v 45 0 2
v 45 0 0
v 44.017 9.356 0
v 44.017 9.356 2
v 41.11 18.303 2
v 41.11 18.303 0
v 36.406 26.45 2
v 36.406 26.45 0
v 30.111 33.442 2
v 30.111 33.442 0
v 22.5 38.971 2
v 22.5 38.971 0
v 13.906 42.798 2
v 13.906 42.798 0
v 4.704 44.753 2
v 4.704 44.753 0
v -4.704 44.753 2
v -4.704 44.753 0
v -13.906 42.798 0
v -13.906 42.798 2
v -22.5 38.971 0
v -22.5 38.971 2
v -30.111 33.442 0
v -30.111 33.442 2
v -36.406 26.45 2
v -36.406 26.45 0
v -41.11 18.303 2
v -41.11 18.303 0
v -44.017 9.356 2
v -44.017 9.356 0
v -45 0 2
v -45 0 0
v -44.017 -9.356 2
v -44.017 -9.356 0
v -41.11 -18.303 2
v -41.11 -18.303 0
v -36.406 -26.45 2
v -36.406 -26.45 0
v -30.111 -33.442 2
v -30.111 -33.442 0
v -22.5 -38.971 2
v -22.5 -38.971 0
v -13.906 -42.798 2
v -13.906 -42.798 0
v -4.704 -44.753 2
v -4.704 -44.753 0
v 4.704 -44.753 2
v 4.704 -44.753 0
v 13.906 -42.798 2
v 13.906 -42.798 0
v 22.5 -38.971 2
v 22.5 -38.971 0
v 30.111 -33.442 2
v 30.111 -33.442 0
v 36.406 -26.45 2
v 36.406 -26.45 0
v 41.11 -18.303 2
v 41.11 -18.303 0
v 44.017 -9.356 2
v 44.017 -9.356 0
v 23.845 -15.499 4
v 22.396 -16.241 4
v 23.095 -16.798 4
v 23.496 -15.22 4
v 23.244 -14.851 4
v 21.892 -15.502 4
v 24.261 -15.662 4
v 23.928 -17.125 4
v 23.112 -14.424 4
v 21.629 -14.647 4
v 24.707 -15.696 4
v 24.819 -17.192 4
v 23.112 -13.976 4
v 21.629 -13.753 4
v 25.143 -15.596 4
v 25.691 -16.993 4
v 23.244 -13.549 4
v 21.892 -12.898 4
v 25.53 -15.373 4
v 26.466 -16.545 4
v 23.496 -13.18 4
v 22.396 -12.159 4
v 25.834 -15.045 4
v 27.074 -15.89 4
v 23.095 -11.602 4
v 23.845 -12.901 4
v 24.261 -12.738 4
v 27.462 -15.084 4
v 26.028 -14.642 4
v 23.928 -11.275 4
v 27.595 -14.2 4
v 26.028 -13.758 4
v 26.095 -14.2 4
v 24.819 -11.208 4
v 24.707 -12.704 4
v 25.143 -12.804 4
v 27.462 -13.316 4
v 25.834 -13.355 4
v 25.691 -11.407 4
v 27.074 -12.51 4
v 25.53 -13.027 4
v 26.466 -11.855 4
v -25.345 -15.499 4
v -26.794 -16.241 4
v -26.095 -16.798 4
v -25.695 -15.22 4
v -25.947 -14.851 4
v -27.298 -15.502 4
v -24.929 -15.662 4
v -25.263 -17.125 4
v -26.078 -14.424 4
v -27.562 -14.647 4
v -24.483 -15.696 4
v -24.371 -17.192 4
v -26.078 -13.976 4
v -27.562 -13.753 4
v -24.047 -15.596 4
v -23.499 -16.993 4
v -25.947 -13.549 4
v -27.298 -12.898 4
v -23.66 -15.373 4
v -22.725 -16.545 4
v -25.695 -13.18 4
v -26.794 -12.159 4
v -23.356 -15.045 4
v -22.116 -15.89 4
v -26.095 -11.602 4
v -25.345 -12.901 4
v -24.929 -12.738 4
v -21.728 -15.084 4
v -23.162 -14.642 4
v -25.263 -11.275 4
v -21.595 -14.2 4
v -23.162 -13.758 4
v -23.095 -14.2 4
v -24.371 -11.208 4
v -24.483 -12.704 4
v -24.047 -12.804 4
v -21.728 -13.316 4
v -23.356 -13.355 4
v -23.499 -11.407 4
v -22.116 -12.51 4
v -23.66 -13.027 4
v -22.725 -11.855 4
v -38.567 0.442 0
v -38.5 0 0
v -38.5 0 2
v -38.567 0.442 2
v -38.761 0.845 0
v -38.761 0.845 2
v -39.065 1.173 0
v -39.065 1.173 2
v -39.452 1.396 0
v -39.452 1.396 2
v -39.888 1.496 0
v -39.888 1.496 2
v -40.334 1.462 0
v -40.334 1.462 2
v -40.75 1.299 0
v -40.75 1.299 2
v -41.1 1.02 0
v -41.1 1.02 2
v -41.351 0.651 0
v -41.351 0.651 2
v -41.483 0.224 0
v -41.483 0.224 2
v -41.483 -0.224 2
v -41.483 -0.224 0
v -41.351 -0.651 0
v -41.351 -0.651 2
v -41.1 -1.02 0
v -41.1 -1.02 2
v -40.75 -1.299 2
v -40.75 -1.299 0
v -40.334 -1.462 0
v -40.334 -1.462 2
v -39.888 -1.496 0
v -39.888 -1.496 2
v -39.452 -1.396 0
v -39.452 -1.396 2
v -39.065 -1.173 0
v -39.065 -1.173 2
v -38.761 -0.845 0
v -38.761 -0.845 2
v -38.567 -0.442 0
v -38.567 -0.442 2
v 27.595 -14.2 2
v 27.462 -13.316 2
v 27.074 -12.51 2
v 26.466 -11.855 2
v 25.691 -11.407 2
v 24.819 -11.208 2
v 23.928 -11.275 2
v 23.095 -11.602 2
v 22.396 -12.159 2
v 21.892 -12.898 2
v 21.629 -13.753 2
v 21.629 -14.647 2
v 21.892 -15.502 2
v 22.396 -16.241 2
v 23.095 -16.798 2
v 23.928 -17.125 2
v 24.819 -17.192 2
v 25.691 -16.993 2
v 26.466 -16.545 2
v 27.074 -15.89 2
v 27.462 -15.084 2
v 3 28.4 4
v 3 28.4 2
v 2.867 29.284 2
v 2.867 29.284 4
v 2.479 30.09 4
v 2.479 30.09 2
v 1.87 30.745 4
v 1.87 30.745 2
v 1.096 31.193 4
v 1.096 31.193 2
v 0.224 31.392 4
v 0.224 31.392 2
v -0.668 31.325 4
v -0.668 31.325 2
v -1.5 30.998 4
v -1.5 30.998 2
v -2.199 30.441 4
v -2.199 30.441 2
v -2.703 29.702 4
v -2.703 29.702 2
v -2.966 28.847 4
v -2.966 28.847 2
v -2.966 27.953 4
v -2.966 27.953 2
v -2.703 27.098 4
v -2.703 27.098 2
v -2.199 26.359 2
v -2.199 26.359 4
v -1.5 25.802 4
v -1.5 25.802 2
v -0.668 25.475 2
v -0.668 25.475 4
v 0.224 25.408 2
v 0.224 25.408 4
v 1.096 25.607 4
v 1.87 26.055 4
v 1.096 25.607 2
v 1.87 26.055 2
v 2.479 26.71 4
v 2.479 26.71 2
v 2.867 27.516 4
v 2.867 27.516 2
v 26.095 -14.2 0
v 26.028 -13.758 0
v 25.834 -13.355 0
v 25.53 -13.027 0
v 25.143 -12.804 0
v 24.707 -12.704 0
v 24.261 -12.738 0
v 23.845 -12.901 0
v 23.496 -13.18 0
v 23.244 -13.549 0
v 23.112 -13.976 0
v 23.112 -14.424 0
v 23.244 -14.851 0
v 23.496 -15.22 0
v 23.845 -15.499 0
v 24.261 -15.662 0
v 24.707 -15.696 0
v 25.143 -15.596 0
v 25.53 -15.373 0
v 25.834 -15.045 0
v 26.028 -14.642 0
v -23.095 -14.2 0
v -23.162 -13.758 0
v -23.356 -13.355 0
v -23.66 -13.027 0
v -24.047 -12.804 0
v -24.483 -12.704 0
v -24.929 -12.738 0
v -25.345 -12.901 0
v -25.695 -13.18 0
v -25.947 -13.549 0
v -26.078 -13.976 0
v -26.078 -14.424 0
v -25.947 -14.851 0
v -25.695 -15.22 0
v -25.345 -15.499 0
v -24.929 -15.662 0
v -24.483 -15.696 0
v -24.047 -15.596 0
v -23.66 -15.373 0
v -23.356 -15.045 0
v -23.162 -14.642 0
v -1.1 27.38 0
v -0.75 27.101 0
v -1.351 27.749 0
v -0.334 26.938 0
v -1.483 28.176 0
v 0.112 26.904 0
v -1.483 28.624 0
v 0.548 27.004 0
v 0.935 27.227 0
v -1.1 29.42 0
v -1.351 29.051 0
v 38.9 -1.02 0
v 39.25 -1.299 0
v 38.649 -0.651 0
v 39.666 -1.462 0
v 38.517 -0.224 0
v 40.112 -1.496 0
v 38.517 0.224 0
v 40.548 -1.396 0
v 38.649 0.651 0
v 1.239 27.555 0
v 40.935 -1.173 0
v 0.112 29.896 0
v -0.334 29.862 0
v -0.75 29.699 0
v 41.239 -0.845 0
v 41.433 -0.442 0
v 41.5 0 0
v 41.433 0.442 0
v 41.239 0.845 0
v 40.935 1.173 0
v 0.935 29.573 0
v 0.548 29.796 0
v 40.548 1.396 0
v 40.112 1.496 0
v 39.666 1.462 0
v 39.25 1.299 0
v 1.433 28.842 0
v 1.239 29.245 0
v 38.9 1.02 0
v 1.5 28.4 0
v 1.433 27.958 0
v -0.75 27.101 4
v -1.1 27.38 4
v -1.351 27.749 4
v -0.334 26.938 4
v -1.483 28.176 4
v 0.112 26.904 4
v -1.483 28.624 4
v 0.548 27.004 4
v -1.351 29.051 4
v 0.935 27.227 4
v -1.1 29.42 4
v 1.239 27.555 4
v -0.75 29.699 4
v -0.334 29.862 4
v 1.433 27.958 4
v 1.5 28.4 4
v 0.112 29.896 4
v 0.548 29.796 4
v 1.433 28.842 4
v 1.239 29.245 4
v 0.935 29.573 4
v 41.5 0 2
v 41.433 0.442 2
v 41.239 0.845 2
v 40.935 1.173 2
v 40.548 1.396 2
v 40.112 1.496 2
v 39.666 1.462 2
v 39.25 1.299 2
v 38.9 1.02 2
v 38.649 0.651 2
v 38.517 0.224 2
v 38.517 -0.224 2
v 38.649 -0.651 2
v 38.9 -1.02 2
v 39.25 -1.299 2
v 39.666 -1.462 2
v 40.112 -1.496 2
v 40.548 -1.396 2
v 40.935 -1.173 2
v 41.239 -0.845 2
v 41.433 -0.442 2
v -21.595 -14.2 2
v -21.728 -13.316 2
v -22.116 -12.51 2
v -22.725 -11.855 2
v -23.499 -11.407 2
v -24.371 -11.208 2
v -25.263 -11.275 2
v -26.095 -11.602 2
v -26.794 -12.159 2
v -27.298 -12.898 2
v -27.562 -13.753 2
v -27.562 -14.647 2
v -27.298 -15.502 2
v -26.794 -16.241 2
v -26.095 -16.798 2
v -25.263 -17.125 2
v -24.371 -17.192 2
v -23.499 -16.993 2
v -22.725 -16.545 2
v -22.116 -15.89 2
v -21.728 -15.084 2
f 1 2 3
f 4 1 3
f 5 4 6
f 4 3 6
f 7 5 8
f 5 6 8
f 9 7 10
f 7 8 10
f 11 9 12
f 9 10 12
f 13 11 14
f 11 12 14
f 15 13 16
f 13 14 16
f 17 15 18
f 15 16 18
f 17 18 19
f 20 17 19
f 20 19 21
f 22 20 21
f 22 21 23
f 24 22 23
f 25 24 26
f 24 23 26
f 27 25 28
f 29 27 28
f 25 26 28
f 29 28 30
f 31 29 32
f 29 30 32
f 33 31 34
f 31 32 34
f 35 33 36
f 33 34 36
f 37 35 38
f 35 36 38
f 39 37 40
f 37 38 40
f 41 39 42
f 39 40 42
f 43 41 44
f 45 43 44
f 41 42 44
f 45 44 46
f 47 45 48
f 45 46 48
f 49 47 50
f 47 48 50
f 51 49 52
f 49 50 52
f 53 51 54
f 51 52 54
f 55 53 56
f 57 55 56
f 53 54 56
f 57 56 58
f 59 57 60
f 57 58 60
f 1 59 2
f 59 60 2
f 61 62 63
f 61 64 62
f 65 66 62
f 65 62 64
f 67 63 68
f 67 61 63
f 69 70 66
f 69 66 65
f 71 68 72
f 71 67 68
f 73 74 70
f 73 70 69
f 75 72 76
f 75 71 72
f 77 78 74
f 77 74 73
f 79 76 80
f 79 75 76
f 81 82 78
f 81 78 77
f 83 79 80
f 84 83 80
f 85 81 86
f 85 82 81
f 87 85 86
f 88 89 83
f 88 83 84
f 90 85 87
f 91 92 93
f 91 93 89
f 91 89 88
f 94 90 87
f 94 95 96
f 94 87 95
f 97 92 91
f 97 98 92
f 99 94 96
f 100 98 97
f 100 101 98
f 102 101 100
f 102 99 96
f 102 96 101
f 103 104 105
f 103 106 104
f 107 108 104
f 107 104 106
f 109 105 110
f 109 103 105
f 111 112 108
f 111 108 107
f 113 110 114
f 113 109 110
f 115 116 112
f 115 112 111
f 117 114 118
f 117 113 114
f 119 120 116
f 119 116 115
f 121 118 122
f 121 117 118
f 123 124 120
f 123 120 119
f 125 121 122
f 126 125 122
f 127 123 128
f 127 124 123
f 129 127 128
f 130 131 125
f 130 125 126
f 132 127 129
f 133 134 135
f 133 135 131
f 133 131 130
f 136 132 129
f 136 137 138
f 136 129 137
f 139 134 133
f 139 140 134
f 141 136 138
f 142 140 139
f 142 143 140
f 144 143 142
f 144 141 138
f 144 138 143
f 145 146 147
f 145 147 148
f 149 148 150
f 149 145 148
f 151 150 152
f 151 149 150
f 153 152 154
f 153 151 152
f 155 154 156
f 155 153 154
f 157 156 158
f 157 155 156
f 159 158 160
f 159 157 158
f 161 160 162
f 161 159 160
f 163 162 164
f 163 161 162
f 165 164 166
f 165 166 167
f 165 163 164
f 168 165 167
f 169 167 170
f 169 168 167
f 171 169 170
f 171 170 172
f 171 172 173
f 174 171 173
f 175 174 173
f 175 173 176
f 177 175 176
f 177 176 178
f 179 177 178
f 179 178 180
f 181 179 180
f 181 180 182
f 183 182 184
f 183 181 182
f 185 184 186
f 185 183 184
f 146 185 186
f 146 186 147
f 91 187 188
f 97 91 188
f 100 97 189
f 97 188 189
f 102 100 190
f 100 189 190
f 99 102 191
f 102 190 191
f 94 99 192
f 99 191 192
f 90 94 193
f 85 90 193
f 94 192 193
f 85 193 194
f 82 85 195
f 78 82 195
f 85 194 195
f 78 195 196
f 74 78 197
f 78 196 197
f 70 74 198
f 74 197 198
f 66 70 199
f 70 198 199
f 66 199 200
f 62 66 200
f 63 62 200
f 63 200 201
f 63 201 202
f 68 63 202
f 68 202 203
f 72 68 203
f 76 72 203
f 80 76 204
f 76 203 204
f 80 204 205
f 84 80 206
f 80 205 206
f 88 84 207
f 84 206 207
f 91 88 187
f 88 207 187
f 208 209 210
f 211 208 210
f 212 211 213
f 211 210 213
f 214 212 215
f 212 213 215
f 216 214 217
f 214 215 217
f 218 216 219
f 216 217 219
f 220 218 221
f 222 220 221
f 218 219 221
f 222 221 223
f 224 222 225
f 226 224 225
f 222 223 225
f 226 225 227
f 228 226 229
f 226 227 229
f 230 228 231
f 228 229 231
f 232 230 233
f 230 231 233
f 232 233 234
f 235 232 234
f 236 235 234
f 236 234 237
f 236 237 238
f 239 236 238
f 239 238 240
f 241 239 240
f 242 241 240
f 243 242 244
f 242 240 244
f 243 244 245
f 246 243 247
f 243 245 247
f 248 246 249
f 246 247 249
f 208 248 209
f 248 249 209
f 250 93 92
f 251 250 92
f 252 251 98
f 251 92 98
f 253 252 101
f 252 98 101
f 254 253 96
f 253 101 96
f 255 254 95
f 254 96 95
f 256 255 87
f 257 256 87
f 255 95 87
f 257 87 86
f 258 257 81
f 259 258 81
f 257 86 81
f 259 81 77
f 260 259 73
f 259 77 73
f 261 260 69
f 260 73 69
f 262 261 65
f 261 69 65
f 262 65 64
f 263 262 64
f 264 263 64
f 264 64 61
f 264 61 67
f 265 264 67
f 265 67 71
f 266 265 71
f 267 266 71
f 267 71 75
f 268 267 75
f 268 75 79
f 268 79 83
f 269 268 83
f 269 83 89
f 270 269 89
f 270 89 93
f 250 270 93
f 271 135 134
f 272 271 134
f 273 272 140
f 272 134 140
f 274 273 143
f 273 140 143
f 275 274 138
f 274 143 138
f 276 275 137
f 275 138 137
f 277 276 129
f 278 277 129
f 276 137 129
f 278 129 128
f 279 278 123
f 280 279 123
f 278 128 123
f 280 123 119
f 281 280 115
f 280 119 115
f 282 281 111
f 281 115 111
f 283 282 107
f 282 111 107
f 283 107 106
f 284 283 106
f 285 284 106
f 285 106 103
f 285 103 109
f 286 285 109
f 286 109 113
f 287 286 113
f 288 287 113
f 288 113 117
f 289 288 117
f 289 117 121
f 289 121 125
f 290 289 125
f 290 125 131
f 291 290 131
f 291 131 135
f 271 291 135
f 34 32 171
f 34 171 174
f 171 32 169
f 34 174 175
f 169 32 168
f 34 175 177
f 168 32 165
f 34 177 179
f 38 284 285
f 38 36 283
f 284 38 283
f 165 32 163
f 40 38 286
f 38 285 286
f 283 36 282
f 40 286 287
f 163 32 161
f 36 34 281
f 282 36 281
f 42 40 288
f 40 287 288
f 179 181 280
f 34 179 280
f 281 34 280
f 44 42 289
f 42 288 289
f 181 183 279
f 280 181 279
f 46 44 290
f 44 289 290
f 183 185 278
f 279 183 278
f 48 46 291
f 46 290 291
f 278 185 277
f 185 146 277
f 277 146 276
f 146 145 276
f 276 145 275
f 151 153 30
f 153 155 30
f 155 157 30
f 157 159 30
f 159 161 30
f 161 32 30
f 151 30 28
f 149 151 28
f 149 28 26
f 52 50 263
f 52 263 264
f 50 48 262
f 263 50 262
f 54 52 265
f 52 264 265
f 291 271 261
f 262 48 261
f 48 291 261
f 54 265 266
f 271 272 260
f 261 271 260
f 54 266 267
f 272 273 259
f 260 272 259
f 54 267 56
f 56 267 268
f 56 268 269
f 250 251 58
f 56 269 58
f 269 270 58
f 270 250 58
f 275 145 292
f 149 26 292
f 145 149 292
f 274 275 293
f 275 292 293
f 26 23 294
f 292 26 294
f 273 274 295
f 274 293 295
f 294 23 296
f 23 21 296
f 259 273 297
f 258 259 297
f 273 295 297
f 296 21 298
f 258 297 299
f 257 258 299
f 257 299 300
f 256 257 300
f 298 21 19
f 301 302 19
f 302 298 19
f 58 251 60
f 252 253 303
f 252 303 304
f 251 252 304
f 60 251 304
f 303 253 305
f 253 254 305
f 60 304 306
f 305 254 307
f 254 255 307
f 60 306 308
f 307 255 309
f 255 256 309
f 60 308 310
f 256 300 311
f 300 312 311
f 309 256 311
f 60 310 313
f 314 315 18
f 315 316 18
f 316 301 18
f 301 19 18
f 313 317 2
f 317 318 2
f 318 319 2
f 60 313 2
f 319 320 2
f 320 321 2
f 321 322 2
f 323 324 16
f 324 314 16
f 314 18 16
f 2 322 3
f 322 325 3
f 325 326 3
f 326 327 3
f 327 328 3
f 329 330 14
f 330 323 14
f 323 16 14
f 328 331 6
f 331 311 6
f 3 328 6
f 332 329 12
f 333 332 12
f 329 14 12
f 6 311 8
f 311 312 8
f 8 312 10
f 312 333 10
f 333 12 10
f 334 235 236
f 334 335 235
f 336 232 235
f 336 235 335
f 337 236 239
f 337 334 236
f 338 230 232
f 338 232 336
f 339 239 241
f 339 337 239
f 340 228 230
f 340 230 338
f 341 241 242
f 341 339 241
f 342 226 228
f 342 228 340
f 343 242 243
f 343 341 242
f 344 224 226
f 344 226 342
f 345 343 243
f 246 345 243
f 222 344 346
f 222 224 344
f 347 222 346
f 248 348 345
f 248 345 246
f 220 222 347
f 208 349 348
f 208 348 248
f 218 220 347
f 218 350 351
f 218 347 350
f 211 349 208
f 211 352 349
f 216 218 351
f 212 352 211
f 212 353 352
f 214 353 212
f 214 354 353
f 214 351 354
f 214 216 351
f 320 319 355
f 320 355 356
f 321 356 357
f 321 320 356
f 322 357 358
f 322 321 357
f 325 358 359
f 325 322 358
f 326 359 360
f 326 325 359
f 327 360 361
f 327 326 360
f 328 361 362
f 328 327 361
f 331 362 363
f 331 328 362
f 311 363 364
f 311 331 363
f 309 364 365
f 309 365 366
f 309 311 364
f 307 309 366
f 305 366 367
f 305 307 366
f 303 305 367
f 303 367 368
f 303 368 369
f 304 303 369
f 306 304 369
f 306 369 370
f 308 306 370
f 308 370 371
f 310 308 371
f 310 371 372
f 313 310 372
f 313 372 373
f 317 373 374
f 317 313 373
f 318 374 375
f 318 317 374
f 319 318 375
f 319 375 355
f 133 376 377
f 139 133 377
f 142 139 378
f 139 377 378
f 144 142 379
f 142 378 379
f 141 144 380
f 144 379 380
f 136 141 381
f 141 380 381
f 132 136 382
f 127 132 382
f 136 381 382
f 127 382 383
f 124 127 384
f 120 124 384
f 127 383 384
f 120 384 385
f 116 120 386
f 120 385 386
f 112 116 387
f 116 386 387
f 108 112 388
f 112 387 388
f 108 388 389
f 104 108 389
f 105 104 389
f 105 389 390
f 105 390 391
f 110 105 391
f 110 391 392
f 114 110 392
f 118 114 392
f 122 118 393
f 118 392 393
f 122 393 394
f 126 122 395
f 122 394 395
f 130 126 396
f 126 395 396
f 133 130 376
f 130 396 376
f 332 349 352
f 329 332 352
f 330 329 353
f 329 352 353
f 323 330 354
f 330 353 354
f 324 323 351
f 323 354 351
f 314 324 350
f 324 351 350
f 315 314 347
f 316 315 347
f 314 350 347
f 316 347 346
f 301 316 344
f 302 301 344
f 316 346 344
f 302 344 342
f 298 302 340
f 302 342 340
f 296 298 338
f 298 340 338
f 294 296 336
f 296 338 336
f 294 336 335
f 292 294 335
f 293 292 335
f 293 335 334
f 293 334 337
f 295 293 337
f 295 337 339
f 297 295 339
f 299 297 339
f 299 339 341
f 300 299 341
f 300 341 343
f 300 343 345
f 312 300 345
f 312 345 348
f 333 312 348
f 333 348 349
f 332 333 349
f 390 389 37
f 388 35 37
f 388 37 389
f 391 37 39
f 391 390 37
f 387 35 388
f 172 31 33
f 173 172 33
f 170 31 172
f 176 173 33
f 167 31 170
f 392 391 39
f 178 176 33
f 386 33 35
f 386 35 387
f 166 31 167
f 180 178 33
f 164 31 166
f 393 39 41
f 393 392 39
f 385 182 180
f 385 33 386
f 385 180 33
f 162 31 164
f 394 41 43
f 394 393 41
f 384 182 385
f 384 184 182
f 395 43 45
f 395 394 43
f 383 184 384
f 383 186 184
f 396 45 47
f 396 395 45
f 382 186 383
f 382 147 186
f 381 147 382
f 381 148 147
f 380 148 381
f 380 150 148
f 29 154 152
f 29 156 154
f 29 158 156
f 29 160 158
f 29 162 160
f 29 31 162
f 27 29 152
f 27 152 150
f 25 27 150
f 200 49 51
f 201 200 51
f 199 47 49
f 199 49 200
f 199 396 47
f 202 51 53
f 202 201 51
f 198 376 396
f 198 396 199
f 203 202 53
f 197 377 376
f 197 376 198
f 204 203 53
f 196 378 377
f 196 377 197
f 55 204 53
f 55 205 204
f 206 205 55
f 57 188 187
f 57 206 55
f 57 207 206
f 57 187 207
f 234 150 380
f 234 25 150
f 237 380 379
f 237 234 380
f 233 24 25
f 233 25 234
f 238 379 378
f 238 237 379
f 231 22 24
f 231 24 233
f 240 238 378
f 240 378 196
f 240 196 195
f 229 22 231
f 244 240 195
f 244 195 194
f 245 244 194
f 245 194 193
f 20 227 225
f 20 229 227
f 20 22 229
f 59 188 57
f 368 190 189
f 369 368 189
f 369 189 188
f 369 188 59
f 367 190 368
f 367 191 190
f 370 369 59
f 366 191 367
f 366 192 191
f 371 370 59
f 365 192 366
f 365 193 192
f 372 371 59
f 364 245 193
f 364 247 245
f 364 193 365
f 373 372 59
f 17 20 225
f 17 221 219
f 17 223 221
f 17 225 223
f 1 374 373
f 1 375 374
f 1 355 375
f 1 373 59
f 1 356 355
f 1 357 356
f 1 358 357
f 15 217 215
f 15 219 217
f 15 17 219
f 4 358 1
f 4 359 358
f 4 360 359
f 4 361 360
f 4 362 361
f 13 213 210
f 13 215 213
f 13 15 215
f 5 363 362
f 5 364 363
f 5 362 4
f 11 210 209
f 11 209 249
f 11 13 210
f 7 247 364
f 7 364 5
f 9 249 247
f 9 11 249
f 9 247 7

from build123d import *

# Parameters (mm, degrees)
SKETCH_R     = 45
SKETCH_R_2   = 1.5
PAD_DEPTH    = 2
SKETCH001_R  = 3
PAD001_DEPTH = 2
SKETCH002_R  = 1.5
POCKET_DEPTH = 5


with BuildPart() as part:
    # Sketch → Pad (new body)
    with BuildSketch(Plane.XY):
        Circle(SKETCH_R)
        with Locations((-40, 0)):
            Circle(SKETCH_R_2, mode=Mode.SUBTRACT)
        with Locations((40, 0)):
            Circle(SKETCH_R_2, mode=Mode.SUBTRACT)
    extrude(amount=PAD_DEPTH)

    # Sketch001 (on Face5 of Pad) → Pad001 (join)
    with BuildSketch(Plane.XY.offset(2)):
        with Locations((-24.595121, -14.2)):
            Circle(SKETCH001_R)
        with Locations((0, 28.4)):
            Circle(SKETCH001_R)
        with Locations((24.595121, -14.2)):
            Circle(SKETCH001_R)
    extrude(amount=PAD001_DEPTH)

    # Sketch002 (on Face9 of Pad001) → Pocket (cut)
    with BuildSketch(Plane.XY.offset(4)):
        with Locations((-24.595121, -14.2)):
            Circle(SKETCH002_R)
        with Locations((0, 28.4)):
            Circle(SKETCH002_R)
        with Locations((24.595121, -14.2)):
            Circle(SKETCH002_R)
    extrude(amount=-POCKET_DEPTH, mode=Mode.SUBTRACT)


solid = part.part
